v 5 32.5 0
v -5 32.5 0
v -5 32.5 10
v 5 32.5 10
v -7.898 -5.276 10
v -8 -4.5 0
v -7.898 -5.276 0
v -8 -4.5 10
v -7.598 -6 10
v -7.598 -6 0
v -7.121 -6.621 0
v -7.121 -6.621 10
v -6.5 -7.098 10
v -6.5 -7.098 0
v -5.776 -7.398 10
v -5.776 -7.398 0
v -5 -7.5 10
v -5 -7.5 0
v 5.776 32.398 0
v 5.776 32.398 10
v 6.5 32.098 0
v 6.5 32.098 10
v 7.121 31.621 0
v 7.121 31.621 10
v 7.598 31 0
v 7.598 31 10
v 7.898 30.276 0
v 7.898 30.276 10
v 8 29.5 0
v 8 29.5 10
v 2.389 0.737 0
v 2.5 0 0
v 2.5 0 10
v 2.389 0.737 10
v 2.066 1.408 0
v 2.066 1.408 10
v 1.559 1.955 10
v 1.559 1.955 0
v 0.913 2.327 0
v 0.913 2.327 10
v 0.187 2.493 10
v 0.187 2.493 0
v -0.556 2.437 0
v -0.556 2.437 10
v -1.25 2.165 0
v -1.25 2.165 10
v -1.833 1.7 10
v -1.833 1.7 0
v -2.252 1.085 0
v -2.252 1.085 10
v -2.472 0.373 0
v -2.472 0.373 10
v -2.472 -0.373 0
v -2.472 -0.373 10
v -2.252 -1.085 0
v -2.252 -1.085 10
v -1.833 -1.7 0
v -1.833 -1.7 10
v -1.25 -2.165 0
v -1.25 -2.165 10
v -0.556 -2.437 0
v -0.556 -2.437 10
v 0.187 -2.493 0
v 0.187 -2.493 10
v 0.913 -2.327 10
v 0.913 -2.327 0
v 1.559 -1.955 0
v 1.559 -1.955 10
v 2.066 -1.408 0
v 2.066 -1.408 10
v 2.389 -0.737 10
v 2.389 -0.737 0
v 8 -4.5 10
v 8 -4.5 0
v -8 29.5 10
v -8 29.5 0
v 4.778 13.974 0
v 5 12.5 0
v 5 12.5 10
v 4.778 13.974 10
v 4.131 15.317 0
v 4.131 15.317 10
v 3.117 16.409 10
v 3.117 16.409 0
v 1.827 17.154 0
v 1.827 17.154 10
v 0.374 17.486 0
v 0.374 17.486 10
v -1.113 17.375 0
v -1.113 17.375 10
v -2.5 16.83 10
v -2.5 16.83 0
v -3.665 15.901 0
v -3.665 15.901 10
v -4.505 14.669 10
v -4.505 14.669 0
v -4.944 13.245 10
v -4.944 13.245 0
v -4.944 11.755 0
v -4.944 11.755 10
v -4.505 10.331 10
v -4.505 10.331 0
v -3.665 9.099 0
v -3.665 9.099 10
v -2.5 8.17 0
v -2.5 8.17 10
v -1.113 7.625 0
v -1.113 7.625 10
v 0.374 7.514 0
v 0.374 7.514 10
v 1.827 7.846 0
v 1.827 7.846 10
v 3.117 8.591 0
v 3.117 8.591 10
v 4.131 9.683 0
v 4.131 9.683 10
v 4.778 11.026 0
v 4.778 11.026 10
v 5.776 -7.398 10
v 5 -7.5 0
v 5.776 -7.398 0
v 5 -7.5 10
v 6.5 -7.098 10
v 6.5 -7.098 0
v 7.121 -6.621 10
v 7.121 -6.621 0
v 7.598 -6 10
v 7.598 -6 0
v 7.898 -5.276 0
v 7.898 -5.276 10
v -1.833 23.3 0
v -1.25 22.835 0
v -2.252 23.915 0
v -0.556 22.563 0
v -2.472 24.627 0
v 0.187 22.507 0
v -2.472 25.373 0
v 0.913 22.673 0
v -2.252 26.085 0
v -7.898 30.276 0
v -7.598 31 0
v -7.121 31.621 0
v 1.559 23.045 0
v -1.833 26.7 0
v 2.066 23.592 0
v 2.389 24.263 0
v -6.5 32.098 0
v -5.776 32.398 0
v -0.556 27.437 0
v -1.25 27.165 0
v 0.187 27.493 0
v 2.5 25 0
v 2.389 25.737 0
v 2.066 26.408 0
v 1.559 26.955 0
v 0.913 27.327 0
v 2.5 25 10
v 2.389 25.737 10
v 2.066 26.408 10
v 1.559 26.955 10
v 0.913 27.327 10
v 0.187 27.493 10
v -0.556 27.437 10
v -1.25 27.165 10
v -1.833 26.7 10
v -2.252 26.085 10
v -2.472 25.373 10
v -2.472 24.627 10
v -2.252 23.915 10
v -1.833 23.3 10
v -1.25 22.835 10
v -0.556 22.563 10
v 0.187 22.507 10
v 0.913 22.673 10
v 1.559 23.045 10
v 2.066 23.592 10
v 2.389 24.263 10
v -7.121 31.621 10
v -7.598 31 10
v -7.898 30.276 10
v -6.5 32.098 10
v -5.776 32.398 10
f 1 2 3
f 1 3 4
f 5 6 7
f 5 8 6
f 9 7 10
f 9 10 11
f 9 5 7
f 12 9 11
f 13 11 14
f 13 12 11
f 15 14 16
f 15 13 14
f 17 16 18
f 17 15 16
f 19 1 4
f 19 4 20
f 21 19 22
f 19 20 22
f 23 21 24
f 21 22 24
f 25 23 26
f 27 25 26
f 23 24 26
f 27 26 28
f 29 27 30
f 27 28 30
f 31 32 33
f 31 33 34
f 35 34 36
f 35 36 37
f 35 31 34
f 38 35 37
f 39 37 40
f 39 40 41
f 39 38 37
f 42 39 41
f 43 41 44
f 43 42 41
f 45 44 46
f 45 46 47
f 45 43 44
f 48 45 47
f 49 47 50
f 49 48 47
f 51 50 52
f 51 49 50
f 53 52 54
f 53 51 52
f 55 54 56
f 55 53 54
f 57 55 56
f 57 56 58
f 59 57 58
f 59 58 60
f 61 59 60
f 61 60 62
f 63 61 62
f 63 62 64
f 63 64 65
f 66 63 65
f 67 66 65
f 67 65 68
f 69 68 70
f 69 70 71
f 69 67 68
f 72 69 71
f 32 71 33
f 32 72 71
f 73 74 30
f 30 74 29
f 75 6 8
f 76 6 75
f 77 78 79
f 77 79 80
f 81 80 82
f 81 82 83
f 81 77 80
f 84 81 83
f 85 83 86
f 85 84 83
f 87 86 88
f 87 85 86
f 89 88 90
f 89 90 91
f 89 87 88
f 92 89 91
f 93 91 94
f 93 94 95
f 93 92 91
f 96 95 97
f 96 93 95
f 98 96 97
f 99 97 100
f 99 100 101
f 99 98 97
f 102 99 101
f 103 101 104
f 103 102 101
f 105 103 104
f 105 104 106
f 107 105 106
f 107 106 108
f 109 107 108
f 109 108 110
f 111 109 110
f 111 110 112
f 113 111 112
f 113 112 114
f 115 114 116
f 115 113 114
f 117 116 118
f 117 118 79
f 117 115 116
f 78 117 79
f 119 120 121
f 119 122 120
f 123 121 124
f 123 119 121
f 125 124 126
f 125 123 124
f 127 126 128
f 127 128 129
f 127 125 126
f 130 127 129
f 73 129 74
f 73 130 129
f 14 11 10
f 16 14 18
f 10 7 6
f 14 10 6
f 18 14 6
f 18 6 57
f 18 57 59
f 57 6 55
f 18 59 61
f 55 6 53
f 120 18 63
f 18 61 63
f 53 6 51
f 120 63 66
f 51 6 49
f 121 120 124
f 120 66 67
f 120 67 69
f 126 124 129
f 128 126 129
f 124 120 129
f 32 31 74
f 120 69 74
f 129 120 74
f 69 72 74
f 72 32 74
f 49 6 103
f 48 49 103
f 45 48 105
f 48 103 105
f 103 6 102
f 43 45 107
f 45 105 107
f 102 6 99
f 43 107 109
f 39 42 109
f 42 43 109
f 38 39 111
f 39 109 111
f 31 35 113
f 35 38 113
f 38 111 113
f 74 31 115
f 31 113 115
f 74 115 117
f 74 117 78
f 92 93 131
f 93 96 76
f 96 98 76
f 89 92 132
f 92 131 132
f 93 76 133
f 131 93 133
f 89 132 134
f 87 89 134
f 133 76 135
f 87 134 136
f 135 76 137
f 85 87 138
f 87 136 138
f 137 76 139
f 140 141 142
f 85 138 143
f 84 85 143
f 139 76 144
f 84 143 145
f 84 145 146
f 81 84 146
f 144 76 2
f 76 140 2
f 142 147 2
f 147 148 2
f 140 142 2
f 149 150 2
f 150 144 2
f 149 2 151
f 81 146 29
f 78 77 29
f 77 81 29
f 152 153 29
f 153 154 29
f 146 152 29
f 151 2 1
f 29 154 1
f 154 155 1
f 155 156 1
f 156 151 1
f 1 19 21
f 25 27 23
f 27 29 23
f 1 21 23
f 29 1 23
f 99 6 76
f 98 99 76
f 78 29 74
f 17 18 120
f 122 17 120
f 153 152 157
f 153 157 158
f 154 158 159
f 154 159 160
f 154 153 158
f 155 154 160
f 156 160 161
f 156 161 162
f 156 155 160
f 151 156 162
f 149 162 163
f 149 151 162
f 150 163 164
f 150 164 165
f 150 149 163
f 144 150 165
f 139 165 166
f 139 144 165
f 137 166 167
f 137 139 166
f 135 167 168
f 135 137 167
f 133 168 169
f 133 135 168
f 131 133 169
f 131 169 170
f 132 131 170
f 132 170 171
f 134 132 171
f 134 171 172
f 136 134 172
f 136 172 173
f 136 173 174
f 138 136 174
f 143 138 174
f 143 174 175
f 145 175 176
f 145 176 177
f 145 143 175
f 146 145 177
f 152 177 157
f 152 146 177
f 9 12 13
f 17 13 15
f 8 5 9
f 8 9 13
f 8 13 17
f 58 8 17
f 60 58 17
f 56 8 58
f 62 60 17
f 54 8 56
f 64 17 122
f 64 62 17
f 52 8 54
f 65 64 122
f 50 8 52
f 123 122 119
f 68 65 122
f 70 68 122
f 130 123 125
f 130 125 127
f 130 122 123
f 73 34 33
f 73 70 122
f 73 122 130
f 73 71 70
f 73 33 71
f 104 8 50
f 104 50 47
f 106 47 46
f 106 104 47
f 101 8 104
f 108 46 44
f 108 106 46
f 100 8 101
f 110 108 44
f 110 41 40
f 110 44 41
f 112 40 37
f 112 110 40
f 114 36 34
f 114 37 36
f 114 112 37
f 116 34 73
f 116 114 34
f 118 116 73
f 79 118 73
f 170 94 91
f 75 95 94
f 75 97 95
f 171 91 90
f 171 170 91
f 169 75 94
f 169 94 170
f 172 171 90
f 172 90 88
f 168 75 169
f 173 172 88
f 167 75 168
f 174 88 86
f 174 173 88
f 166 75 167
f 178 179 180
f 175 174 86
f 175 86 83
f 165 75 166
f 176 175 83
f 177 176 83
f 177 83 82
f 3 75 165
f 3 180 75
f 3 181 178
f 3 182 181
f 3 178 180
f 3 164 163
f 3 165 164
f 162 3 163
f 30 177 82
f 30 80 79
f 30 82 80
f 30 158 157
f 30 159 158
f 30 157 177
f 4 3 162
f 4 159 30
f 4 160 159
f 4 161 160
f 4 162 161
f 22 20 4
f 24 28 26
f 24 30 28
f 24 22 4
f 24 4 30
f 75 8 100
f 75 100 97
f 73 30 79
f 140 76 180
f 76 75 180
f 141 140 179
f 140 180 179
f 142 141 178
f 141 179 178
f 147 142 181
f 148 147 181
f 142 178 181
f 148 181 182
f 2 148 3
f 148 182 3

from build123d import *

# Parameters (mm, degrees)
SKETCH_1_W      = 16
SKETCH_1_H      = 40
SKETCH_1_R      = 2.5
SKETCH_1_R_2    = 5
EXTRUDE_1_DEPTH = 10
FILLET_1_R      = 3


with BuildPart() as part:
    # 草图1 → 凸台-拉伸1 (new body)
    with BuildSketch(Plane.XY):
        with Locations((0, 12.5)):
            Rectangle(SKETCH_1_W, SKETCH_1_H)
        with Locations((0, 25)):
            Circle(SKETCH_1_R, mode=Mode.SUBTRACT)
        Circle(SKETCH_1_R, mode=Mode.SUBTRACT)
        with Locations((0, 12.5)):
            Circle(SKETCH_1_R_2, mode=Mode.SUBTRACT)
    extrude(amount=EXTRUDE_1_DEPTH)

    # 圆角1
    fillet_1_edges = [part.edges().sort_by_distance(p)[0] for p in [
        (8, -7.5, 5),
        (-8, -7.5, 5),
        (-8, 32.5, 5),
        (8, 32.5, 5),
    ]]
    fillet(fillet_1_edges, radius=FILLET_1_R)


solid = part.part
